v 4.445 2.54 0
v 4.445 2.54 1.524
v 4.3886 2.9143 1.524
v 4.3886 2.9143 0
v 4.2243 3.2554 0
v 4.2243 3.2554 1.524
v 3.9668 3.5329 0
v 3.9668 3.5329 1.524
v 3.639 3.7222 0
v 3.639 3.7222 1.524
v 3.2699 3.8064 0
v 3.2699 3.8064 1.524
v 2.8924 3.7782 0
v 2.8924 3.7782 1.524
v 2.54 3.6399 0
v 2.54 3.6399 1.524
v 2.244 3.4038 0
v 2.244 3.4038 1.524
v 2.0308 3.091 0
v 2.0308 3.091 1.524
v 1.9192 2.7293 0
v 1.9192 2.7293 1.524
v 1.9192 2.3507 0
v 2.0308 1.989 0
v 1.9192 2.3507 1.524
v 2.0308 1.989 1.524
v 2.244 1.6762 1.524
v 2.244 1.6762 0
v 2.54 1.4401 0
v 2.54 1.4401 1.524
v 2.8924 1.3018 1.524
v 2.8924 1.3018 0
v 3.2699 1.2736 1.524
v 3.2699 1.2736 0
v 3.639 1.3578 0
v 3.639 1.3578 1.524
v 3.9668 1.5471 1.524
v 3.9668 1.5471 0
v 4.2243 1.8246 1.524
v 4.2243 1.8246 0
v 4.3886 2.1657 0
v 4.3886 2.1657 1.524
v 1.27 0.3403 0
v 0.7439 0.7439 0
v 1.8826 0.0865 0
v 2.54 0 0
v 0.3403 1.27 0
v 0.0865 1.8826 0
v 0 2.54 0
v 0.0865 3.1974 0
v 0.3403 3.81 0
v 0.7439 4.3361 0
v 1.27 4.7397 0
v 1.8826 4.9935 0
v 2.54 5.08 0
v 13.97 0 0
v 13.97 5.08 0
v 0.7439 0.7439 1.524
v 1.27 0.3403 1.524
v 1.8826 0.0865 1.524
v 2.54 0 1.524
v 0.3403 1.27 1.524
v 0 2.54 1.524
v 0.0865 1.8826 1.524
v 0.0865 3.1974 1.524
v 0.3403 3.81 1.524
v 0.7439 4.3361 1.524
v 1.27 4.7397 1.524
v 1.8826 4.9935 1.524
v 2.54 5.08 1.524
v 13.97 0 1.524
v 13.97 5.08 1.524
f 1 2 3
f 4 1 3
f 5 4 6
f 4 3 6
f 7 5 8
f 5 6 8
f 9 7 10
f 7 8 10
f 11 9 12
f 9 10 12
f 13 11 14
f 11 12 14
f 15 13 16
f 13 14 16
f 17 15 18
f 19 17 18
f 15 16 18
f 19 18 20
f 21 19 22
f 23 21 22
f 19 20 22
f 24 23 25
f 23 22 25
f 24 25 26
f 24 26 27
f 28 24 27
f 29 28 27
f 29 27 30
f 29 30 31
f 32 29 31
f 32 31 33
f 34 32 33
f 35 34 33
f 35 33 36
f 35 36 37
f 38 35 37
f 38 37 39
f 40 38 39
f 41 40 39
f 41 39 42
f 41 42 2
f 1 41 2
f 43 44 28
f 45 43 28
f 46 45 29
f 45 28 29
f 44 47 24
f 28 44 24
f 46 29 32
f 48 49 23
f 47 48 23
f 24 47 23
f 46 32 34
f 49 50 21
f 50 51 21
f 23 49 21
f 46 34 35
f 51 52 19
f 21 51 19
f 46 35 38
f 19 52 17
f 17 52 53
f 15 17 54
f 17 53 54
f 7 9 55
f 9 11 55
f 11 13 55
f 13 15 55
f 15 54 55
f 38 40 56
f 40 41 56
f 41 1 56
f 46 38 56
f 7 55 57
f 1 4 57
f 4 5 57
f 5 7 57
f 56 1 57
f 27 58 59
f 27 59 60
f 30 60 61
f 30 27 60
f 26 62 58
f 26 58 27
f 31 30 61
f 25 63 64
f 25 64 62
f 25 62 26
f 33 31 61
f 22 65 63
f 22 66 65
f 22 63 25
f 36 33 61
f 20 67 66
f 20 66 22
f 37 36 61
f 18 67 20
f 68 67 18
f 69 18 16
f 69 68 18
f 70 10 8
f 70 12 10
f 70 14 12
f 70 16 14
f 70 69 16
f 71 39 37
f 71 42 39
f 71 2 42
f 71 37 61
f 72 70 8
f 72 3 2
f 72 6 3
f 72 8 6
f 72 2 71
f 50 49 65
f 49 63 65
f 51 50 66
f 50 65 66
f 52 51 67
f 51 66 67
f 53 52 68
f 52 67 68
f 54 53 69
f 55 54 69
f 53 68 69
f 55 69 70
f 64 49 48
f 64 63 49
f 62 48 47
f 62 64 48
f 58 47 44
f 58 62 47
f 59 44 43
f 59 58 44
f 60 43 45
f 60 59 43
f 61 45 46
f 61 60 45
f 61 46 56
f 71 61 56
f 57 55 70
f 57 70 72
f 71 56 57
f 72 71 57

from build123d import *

# Parameters (mm, degrees)
F0_W     = 13.97
F0_H     = 5.08
F1_DEPTH = 1.524
F2_R     = 1.27
F3_DEPTH = 25.4
F4_R     = 2.53999


# Not quite as in the source:
# - a fillet or chamfer is up to 0.001 mm smaller than in the source, because OpenCascade refuses the exact size


with BuildPart() as f1:
    # F0 (on Top) → F1 (new body)
    with BuildSketch(Plane.XY):
        with Locations((6.985, 2.54)):
            Rectangle(F0_W, F0_H)
    extrude(amount=F1_DEPTH)

    # F2 (on face) → F3 (cut)
    with BuildSketch(Plane.XY.offset(1.524)):
        with Locations((3.175, 2.54)):
            Circle(F2_R)
    extrude(amount=-F3_DEPTH, mode=Mode.SUBTRACT)

    # F4 (radius 2.54 in the source; OpenCascade refuses exactly that, so slightly less here)
    f4_edges = [f1.edges().sort_by_distance(p)[0] for p in [
        (0, 0, 0.762),
        (0, 5.08, 0.762),
    ]]
    fillet(f4_edges, radius=F4_R)


solid = f1.part
